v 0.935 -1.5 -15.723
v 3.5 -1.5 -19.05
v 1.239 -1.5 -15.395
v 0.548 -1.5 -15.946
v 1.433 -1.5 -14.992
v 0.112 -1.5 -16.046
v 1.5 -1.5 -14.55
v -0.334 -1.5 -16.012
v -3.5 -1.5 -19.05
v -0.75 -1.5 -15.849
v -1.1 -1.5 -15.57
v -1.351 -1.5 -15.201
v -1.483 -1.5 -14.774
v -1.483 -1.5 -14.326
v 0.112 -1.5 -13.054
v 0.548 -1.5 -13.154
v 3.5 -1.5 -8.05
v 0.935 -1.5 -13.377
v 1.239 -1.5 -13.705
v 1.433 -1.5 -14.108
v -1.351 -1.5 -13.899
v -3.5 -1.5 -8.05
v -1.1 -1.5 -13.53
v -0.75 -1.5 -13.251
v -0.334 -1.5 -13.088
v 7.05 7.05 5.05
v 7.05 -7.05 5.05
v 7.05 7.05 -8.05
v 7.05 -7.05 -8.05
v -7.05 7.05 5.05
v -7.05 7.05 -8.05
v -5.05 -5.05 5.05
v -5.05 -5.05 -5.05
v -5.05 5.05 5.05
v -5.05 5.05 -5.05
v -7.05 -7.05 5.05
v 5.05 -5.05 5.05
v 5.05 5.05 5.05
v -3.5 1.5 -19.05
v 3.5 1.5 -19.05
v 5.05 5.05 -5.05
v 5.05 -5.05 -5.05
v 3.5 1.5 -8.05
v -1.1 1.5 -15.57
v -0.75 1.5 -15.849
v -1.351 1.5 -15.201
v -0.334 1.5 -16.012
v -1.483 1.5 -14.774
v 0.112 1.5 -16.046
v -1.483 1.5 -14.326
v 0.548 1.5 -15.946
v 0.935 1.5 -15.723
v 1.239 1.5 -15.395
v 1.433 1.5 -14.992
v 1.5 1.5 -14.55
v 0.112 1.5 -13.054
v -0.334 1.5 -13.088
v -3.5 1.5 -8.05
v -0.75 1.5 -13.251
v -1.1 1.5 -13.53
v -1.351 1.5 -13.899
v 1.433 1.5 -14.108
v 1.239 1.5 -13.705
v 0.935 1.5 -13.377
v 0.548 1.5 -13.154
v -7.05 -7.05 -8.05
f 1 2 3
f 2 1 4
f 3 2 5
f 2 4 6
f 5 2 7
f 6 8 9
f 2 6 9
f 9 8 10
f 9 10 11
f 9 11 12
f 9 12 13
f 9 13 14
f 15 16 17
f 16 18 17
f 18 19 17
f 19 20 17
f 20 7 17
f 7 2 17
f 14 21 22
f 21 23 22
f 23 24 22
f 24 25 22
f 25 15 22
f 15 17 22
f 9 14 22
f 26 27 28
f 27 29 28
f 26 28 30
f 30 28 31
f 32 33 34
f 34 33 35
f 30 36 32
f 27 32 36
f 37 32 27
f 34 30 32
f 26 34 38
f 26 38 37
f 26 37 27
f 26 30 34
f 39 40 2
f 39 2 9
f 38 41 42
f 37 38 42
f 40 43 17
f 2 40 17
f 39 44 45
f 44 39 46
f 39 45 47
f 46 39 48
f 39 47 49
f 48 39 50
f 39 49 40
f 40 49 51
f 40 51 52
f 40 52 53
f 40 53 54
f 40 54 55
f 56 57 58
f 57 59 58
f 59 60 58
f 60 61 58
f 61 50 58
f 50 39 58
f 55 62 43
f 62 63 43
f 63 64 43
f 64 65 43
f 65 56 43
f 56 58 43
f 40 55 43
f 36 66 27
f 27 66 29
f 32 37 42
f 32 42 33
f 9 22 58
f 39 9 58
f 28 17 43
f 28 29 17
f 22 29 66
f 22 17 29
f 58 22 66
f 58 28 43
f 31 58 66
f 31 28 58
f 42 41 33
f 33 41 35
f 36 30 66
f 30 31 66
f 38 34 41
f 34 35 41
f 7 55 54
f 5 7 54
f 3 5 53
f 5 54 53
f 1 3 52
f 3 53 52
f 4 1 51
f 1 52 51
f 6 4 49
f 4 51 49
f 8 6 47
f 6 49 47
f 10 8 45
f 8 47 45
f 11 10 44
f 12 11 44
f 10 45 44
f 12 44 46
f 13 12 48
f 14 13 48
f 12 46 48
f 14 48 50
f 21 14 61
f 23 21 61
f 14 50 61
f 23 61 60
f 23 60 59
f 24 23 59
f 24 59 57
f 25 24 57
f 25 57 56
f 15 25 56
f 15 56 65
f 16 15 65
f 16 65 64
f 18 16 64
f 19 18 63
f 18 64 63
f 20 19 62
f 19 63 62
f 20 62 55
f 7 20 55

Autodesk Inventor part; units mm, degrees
ref_plane "YZ Plane" through (0, 0, 0) normal (1, 0, 0) x (0, 1, 0)
ref_plane "XZ Plane" through (0, 0, 0) normal (0, 1, 0) x (-1, 0, 0)
ref_plane "XY Plane" through (0, 0, 0) normal (0, 0, 1) x (1, 0, 0)
sketch "スケッチ1" plane through (0, 0, 0) normal (0, 0, 1) x (1, 0, 0)
  line L0 (-5.05, 5.05) -> (5.05, 5.05)
  line L1 (5.05, 5.05) -> (5.05, -5.05)
  line L2 (5.05, -5.05) -> (-5.05, -5.05)
  line L3 (-5.05, -5.05) -> (-5.05, 5.05)
  line L4 (0, -9.87) -> (0, 9.87) projected
  line L5 (-9.87, 0) -> (9.87, 0) projected
  line L6 (7.05, 7.05) -> (-7.05, 7.05)
  line L7 (-7.05, 7.05) -> (-7.05, -7.05)
  line L8 (-7.05, -7.05) -> (7.05, -7.05)
  line L9 (7.05, -7.05) -> (7.05, 7.05)
  point P0 (0, 0)
  dimension "d0" = 10.1
  dimension "d1" = 2
  dimension "d27" = 10.1
extrude "押し出し1" add sketch "スケッチ1" along normal mid plane 10.1 contours L3 L5 L7 L6 L4 L0 | L4 L6 L9 L5 L1 L0 | L3 L2 L4 L8 L7 L5 | L5 L9 L8 L4 L2 L1
sketch "スケッチ2" plane through (0, 0, -5.05) normal (0, 0, -1) x (-1, 0, 0)
  line L0 (-7.05, -7.05) -> (-7.05, 7.05) projected
  line L1 (7.05, 7.05) -> (-7.05, 7.05) projected
  line L2 (-7.05, -7.05) -> (7.05, -7.05) projected
  line L3 (7.05, -7.05) -> (7.05, 7.05) projected
  line L4 (7.05, 7.05) -> (-7.05, 7.05) projected
  line L5 (-7.05, 7.05) -> (-7.05, -7.05) projected
  line L6 (5.05, 5.05) -> (5.05, -5.05) projected
  line L7 (5.05, -5.05) -> (-5.05, -5.05) projected
  line L8 (-5.05, -5.05) -> (-5.05, 5.05) projected
  line L9 (-5.05, 5.05) -> (5.05, 5.05) projected
  line L10 (-7.05, 7.05) -> (7.05, 7.05) projected
  line L11 (-7.05, 7.05) -> (7.05, 7.05)
  line L12 (7.05, 7.05) -> (7.05, -7.05) projected
  line L13 (7.05, -7.05) -> (-7.05, -7.05)
  line L14 (9.87, 0) -> (-9.87, 0) projected
  line L15 (0, -10.0068) -> (0, 10.0068) projected
  line L16 (-7.05, 7.05) -> (-7.05, -7.05)
  line L17 (7.05, 7.05) -> (7.05, -7.05)
  point P0 (0, 0)
extrude "押し出し2" add sketch "スケッチ2" along normal blind 3
sketch "スケッチ4" plane through (0, 0, -8.05) normal (0, 0, -1) x (-1, 0, 0)
  line L0 (3.5, 1.5) -> (-3.5, 1.5)
  line L1 (-3.5, 1.5) -> (-3.5, -1.5)
  line L2 (-3.5, -1.5) -> (3.5, -1.5)
  line L3 (3.5, -1.5) -> (3.5, 1.5)
  line L4 (9.87, 0) -> (-9.87, 0) projected
  line L5 (0, -9.87) -> (0, 9.87) projected
  point P0 (0, 0)
  dimension "d19" = 3
  dimension "d20" = 7
extrude "押し出し4" add sketch "スケッチ4" along normal blind 11
sketch "スケッチ5" plane through (-3.5, 1.5, -8.05) normal (0, 1, 0) x (1, 0, 0)
  circle A0 centre (3.5, 6.5) radius 1.5
  line L0 (-3.55, 0) -> (10.55, 0) projected
  line L1 (3.5, 15.82) -> (3.5, -17.92) projected
  point P0 (3.5, -8.05)
  dimension "d23" = 3
  dimension "d24" = 6.5
extrude "押し出し5" cut sketch "スケッチ5" against normal up to surface (3 mm away)
properties part number "adapter_for_magnet"
